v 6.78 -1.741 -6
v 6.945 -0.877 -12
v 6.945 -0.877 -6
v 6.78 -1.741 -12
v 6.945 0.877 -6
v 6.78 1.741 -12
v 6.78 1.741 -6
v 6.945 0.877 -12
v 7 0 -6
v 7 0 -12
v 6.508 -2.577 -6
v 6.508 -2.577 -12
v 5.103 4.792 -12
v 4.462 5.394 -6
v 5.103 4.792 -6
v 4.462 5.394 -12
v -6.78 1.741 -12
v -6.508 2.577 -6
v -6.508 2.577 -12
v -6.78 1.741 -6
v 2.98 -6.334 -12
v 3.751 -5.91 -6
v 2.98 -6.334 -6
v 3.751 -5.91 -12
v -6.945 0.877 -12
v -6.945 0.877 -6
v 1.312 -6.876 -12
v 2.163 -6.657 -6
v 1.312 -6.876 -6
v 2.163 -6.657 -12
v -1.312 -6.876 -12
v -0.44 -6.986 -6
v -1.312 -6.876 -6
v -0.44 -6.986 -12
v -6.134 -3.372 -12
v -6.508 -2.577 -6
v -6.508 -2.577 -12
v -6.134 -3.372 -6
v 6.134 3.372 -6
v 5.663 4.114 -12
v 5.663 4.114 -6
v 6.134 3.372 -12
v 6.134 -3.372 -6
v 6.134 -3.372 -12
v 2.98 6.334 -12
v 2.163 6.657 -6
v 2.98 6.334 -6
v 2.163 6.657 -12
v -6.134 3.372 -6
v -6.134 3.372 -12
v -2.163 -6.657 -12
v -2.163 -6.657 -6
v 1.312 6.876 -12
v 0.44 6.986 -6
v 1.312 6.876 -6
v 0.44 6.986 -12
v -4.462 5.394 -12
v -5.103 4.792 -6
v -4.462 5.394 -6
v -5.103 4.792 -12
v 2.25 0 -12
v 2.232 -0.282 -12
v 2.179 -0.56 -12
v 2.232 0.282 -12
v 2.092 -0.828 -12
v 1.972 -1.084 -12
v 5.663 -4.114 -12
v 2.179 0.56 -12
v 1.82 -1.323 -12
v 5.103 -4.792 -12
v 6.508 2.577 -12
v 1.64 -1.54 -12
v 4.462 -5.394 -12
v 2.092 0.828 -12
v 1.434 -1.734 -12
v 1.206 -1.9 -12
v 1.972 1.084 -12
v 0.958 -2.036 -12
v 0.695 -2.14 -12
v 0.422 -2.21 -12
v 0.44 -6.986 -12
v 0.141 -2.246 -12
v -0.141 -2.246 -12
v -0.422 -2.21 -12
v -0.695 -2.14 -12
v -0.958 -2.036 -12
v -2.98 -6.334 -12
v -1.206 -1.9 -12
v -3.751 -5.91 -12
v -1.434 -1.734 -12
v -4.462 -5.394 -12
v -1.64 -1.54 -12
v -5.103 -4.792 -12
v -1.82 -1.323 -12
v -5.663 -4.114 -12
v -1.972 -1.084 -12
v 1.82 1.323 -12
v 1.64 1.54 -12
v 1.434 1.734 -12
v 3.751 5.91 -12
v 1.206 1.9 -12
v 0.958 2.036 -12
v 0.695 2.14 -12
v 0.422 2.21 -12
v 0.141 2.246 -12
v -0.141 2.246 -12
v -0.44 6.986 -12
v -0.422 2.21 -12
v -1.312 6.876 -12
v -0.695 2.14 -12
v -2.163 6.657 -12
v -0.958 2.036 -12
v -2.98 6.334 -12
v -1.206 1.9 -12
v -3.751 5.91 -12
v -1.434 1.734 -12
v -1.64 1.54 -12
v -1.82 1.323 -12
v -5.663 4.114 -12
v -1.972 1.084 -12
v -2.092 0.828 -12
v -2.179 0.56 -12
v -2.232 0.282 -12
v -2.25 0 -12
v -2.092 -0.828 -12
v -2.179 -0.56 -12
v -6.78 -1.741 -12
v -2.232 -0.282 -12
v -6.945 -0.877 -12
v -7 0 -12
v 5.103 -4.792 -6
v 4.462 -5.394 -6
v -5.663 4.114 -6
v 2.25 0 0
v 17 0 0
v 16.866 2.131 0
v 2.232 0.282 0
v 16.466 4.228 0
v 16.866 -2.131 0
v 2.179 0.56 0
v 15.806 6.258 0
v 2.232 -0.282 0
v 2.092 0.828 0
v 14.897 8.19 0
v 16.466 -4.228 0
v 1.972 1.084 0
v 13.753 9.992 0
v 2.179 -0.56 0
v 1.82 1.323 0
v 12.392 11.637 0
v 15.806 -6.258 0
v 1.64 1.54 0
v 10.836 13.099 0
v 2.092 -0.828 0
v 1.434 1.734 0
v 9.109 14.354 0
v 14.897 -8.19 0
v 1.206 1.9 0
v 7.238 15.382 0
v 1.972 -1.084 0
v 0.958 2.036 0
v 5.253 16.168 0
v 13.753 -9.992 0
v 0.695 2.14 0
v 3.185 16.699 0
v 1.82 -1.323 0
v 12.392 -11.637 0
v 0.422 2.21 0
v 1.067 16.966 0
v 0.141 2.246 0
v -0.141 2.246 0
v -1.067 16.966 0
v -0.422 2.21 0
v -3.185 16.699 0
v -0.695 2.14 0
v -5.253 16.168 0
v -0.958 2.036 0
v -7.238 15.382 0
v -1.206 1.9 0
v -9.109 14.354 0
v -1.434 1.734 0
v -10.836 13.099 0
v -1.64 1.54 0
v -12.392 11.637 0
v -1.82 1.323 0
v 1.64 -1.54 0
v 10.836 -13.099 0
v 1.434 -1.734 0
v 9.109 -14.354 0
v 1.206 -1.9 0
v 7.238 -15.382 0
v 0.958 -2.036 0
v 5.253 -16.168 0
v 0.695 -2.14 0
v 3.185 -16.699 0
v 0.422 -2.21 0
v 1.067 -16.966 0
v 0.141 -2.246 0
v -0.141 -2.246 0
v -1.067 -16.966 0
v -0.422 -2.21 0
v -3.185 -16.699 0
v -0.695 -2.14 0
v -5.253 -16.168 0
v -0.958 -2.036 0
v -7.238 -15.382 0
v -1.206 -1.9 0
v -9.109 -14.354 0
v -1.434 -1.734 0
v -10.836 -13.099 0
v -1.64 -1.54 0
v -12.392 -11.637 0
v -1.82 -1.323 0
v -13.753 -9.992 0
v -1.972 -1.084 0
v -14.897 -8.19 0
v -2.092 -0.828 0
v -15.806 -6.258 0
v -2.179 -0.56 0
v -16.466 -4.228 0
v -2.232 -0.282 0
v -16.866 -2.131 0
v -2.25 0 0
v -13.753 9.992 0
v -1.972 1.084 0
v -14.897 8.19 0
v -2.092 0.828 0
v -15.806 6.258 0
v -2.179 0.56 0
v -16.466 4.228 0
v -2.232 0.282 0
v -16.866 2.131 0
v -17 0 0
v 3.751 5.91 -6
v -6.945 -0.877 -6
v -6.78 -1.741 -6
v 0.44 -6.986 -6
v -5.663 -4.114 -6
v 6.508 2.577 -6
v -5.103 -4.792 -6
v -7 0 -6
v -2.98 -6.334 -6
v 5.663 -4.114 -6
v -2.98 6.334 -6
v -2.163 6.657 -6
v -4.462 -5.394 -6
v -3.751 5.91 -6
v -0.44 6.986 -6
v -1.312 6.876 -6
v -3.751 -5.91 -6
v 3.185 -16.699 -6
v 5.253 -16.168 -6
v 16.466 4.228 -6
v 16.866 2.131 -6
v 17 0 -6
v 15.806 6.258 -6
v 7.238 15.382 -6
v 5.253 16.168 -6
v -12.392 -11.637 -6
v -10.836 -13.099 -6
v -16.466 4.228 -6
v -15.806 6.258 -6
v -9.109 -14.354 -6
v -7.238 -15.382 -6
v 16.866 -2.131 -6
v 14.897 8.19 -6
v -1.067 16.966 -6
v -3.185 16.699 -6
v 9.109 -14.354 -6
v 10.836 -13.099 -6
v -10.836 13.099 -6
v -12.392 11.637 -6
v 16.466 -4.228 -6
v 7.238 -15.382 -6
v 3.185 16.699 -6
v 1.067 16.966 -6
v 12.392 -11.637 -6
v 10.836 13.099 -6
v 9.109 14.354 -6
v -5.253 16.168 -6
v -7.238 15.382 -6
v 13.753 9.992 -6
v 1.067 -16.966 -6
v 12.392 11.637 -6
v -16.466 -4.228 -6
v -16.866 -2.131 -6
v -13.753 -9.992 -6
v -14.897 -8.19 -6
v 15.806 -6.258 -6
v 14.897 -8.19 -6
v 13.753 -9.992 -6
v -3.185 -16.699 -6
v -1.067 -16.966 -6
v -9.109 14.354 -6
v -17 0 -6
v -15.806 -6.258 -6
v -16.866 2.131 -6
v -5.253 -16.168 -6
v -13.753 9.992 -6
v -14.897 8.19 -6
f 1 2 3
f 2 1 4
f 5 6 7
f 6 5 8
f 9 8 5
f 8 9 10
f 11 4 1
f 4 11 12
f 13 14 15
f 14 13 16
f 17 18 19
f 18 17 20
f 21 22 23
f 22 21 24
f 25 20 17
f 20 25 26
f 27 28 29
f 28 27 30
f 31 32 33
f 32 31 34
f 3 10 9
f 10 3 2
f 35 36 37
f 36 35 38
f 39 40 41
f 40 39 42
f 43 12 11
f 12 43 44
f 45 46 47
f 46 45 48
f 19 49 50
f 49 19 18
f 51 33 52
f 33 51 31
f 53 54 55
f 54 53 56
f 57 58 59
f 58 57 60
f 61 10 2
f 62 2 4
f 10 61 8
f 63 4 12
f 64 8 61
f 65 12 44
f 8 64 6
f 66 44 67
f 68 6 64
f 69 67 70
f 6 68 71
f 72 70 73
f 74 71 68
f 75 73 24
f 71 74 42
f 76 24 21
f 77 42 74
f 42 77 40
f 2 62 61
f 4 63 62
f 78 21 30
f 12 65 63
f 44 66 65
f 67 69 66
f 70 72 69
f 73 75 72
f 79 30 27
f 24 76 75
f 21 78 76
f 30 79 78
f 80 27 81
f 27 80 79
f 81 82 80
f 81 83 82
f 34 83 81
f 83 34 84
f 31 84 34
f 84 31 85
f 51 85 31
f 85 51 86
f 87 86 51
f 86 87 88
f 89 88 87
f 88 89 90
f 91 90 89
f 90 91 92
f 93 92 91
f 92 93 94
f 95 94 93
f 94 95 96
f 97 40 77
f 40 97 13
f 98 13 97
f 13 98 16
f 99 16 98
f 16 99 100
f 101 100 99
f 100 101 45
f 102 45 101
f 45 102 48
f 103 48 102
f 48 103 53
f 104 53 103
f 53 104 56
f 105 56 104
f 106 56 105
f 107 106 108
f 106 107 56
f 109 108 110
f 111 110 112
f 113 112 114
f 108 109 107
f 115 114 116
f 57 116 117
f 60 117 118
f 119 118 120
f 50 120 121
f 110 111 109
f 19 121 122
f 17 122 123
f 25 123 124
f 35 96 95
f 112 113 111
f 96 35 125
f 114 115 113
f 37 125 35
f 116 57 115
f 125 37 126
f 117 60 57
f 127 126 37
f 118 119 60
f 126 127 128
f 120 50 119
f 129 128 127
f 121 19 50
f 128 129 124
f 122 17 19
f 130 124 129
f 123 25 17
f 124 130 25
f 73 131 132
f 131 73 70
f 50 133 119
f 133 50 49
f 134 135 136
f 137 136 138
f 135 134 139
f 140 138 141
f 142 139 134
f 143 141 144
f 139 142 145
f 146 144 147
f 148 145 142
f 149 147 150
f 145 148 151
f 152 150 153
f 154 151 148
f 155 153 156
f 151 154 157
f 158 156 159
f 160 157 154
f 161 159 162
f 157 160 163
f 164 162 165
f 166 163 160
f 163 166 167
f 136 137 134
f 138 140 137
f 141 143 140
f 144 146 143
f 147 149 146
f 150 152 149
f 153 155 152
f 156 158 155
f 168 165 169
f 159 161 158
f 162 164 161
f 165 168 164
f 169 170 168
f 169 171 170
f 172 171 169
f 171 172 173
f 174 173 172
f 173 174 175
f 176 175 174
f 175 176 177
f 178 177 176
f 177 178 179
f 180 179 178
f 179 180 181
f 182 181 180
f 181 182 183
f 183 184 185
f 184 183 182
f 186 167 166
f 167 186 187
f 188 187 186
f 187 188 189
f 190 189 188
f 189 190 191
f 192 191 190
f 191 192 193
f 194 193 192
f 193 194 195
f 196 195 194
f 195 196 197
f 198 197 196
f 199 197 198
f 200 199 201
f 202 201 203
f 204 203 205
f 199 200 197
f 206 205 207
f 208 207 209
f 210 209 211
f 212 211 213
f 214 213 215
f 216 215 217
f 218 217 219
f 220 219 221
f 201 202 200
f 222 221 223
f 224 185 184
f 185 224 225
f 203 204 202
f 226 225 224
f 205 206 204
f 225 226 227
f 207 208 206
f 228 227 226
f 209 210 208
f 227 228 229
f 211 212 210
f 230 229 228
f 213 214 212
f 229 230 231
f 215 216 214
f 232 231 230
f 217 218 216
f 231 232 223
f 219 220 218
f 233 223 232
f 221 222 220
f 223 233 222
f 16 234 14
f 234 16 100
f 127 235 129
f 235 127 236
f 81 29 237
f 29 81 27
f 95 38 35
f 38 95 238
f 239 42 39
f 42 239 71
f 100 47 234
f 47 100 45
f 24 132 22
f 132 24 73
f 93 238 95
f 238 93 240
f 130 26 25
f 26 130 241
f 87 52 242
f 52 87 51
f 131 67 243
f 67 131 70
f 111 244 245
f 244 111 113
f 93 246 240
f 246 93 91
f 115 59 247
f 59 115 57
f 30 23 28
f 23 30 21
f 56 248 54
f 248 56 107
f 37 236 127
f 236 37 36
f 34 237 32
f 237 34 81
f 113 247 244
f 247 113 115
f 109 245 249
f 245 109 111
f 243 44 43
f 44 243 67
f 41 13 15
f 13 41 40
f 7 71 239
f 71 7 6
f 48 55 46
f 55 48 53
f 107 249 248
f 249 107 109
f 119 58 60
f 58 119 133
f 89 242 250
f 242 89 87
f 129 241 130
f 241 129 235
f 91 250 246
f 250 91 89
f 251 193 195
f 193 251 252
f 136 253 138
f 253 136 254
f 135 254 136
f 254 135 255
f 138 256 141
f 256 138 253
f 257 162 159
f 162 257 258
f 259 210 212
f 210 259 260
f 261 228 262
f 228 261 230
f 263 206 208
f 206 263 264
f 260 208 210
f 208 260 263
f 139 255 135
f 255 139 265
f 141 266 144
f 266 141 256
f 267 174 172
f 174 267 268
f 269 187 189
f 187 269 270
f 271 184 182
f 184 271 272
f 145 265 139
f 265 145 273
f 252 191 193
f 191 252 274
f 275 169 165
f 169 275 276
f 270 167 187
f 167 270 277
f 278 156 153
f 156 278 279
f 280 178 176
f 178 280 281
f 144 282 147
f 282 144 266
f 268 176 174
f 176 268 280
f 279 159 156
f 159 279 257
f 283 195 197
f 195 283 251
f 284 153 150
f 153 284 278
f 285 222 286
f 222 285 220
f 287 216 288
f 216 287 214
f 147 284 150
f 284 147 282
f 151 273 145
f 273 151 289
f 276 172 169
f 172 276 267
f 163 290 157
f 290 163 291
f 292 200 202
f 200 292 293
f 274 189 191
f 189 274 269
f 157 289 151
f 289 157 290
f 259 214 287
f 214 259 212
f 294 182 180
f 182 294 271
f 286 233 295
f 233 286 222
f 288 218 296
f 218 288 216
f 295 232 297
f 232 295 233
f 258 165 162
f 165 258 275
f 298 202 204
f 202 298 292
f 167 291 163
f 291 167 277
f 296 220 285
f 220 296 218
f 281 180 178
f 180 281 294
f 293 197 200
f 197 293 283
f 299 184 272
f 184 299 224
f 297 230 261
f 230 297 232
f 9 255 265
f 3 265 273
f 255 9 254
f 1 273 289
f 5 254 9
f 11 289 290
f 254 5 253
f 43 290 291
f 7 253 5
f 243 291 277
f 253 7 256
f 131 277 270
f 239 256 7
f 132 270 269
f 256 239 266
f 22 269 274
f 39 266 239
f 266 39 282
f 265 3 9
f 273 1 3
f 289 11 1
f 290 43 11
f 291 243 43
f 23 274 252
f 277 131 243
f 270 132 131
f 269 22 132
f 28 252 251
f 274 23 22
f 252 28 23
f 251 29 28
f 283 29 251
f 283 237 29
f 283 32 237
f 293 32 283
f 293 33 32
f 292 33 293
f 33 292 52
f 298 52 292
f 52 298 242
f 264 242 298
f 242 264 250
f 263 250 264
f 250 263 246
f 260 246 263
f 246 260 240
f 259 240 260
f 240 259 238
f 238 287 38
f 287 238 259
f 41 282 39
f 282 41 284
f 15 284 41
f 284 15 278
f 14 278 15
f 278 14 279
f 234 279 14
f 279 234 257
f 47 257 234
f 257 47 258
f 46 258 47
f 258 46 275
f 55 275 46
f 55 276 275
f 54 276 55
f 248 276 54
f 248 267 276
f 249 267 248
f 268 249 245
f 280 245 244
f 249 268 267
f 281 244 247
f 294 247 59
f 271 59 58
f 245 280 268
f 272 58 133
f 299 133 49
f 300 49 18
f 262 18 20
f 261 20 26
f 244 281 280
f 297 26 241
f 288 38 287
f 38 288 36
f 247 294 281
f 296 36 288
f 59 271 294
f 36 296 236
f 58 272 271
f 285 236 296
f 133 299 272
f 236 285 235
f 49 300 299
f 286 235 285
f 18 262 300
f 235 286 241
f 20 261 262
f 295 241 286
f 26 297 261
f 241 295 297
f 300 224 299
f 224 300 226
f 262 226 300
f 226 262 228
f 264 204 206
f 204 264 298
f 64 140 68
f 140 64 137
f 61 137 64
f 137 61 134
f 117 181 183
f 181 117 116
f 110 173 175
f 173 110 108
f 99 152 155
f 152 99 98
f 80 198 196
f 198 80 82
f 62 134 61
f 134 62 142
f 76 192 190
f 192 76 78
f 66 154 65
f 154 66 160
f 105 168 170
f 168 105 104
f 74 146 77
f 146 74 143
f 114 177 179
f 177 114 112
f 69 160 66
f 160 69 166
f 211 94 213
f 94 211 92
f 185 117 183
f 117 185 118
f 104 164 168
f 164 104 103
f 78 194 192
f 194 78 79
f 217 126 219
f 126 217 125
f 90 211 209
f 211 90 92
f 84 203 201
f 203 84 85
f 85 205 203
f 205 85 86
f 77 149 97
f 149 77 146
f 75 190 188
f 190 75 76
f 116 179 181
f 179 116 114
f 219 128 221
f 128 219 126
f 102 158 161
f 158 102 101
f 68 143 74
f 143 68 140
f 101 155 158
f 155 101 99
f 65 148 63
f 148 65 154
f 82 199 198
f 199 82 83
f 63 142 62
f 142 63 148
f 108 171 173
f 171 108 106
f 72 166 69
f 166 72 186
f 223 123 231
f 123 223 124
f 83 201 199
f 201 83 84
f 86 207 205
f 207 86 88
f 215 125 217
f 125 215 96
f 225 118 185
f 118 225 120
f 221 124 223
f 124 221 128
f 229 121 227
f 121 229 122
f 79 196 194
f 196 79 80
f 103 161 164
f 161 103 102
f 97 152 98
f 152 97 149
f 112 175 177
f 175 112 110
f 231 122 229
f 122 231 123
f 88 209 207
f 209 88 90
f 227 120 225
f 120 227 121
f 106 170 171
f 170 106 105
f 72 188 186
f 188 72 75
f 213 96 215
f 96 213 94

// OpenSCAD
$fn = 50;


difference() {
	union() {
		translate(v = [0, 0, -12.0000000000]) {
			cylinder(h = 12, r = 7.0000000000);
		}
		translate(v = [0, 0, -6.0000000000]) {
			cylinder(h = 6, r = 17.0000000000);
		}
	}
	union() {
		#translate(v = [0, 0, -12]) {
			cylinder(h = 12, r = 2.2500000000);
		}
	}
}
